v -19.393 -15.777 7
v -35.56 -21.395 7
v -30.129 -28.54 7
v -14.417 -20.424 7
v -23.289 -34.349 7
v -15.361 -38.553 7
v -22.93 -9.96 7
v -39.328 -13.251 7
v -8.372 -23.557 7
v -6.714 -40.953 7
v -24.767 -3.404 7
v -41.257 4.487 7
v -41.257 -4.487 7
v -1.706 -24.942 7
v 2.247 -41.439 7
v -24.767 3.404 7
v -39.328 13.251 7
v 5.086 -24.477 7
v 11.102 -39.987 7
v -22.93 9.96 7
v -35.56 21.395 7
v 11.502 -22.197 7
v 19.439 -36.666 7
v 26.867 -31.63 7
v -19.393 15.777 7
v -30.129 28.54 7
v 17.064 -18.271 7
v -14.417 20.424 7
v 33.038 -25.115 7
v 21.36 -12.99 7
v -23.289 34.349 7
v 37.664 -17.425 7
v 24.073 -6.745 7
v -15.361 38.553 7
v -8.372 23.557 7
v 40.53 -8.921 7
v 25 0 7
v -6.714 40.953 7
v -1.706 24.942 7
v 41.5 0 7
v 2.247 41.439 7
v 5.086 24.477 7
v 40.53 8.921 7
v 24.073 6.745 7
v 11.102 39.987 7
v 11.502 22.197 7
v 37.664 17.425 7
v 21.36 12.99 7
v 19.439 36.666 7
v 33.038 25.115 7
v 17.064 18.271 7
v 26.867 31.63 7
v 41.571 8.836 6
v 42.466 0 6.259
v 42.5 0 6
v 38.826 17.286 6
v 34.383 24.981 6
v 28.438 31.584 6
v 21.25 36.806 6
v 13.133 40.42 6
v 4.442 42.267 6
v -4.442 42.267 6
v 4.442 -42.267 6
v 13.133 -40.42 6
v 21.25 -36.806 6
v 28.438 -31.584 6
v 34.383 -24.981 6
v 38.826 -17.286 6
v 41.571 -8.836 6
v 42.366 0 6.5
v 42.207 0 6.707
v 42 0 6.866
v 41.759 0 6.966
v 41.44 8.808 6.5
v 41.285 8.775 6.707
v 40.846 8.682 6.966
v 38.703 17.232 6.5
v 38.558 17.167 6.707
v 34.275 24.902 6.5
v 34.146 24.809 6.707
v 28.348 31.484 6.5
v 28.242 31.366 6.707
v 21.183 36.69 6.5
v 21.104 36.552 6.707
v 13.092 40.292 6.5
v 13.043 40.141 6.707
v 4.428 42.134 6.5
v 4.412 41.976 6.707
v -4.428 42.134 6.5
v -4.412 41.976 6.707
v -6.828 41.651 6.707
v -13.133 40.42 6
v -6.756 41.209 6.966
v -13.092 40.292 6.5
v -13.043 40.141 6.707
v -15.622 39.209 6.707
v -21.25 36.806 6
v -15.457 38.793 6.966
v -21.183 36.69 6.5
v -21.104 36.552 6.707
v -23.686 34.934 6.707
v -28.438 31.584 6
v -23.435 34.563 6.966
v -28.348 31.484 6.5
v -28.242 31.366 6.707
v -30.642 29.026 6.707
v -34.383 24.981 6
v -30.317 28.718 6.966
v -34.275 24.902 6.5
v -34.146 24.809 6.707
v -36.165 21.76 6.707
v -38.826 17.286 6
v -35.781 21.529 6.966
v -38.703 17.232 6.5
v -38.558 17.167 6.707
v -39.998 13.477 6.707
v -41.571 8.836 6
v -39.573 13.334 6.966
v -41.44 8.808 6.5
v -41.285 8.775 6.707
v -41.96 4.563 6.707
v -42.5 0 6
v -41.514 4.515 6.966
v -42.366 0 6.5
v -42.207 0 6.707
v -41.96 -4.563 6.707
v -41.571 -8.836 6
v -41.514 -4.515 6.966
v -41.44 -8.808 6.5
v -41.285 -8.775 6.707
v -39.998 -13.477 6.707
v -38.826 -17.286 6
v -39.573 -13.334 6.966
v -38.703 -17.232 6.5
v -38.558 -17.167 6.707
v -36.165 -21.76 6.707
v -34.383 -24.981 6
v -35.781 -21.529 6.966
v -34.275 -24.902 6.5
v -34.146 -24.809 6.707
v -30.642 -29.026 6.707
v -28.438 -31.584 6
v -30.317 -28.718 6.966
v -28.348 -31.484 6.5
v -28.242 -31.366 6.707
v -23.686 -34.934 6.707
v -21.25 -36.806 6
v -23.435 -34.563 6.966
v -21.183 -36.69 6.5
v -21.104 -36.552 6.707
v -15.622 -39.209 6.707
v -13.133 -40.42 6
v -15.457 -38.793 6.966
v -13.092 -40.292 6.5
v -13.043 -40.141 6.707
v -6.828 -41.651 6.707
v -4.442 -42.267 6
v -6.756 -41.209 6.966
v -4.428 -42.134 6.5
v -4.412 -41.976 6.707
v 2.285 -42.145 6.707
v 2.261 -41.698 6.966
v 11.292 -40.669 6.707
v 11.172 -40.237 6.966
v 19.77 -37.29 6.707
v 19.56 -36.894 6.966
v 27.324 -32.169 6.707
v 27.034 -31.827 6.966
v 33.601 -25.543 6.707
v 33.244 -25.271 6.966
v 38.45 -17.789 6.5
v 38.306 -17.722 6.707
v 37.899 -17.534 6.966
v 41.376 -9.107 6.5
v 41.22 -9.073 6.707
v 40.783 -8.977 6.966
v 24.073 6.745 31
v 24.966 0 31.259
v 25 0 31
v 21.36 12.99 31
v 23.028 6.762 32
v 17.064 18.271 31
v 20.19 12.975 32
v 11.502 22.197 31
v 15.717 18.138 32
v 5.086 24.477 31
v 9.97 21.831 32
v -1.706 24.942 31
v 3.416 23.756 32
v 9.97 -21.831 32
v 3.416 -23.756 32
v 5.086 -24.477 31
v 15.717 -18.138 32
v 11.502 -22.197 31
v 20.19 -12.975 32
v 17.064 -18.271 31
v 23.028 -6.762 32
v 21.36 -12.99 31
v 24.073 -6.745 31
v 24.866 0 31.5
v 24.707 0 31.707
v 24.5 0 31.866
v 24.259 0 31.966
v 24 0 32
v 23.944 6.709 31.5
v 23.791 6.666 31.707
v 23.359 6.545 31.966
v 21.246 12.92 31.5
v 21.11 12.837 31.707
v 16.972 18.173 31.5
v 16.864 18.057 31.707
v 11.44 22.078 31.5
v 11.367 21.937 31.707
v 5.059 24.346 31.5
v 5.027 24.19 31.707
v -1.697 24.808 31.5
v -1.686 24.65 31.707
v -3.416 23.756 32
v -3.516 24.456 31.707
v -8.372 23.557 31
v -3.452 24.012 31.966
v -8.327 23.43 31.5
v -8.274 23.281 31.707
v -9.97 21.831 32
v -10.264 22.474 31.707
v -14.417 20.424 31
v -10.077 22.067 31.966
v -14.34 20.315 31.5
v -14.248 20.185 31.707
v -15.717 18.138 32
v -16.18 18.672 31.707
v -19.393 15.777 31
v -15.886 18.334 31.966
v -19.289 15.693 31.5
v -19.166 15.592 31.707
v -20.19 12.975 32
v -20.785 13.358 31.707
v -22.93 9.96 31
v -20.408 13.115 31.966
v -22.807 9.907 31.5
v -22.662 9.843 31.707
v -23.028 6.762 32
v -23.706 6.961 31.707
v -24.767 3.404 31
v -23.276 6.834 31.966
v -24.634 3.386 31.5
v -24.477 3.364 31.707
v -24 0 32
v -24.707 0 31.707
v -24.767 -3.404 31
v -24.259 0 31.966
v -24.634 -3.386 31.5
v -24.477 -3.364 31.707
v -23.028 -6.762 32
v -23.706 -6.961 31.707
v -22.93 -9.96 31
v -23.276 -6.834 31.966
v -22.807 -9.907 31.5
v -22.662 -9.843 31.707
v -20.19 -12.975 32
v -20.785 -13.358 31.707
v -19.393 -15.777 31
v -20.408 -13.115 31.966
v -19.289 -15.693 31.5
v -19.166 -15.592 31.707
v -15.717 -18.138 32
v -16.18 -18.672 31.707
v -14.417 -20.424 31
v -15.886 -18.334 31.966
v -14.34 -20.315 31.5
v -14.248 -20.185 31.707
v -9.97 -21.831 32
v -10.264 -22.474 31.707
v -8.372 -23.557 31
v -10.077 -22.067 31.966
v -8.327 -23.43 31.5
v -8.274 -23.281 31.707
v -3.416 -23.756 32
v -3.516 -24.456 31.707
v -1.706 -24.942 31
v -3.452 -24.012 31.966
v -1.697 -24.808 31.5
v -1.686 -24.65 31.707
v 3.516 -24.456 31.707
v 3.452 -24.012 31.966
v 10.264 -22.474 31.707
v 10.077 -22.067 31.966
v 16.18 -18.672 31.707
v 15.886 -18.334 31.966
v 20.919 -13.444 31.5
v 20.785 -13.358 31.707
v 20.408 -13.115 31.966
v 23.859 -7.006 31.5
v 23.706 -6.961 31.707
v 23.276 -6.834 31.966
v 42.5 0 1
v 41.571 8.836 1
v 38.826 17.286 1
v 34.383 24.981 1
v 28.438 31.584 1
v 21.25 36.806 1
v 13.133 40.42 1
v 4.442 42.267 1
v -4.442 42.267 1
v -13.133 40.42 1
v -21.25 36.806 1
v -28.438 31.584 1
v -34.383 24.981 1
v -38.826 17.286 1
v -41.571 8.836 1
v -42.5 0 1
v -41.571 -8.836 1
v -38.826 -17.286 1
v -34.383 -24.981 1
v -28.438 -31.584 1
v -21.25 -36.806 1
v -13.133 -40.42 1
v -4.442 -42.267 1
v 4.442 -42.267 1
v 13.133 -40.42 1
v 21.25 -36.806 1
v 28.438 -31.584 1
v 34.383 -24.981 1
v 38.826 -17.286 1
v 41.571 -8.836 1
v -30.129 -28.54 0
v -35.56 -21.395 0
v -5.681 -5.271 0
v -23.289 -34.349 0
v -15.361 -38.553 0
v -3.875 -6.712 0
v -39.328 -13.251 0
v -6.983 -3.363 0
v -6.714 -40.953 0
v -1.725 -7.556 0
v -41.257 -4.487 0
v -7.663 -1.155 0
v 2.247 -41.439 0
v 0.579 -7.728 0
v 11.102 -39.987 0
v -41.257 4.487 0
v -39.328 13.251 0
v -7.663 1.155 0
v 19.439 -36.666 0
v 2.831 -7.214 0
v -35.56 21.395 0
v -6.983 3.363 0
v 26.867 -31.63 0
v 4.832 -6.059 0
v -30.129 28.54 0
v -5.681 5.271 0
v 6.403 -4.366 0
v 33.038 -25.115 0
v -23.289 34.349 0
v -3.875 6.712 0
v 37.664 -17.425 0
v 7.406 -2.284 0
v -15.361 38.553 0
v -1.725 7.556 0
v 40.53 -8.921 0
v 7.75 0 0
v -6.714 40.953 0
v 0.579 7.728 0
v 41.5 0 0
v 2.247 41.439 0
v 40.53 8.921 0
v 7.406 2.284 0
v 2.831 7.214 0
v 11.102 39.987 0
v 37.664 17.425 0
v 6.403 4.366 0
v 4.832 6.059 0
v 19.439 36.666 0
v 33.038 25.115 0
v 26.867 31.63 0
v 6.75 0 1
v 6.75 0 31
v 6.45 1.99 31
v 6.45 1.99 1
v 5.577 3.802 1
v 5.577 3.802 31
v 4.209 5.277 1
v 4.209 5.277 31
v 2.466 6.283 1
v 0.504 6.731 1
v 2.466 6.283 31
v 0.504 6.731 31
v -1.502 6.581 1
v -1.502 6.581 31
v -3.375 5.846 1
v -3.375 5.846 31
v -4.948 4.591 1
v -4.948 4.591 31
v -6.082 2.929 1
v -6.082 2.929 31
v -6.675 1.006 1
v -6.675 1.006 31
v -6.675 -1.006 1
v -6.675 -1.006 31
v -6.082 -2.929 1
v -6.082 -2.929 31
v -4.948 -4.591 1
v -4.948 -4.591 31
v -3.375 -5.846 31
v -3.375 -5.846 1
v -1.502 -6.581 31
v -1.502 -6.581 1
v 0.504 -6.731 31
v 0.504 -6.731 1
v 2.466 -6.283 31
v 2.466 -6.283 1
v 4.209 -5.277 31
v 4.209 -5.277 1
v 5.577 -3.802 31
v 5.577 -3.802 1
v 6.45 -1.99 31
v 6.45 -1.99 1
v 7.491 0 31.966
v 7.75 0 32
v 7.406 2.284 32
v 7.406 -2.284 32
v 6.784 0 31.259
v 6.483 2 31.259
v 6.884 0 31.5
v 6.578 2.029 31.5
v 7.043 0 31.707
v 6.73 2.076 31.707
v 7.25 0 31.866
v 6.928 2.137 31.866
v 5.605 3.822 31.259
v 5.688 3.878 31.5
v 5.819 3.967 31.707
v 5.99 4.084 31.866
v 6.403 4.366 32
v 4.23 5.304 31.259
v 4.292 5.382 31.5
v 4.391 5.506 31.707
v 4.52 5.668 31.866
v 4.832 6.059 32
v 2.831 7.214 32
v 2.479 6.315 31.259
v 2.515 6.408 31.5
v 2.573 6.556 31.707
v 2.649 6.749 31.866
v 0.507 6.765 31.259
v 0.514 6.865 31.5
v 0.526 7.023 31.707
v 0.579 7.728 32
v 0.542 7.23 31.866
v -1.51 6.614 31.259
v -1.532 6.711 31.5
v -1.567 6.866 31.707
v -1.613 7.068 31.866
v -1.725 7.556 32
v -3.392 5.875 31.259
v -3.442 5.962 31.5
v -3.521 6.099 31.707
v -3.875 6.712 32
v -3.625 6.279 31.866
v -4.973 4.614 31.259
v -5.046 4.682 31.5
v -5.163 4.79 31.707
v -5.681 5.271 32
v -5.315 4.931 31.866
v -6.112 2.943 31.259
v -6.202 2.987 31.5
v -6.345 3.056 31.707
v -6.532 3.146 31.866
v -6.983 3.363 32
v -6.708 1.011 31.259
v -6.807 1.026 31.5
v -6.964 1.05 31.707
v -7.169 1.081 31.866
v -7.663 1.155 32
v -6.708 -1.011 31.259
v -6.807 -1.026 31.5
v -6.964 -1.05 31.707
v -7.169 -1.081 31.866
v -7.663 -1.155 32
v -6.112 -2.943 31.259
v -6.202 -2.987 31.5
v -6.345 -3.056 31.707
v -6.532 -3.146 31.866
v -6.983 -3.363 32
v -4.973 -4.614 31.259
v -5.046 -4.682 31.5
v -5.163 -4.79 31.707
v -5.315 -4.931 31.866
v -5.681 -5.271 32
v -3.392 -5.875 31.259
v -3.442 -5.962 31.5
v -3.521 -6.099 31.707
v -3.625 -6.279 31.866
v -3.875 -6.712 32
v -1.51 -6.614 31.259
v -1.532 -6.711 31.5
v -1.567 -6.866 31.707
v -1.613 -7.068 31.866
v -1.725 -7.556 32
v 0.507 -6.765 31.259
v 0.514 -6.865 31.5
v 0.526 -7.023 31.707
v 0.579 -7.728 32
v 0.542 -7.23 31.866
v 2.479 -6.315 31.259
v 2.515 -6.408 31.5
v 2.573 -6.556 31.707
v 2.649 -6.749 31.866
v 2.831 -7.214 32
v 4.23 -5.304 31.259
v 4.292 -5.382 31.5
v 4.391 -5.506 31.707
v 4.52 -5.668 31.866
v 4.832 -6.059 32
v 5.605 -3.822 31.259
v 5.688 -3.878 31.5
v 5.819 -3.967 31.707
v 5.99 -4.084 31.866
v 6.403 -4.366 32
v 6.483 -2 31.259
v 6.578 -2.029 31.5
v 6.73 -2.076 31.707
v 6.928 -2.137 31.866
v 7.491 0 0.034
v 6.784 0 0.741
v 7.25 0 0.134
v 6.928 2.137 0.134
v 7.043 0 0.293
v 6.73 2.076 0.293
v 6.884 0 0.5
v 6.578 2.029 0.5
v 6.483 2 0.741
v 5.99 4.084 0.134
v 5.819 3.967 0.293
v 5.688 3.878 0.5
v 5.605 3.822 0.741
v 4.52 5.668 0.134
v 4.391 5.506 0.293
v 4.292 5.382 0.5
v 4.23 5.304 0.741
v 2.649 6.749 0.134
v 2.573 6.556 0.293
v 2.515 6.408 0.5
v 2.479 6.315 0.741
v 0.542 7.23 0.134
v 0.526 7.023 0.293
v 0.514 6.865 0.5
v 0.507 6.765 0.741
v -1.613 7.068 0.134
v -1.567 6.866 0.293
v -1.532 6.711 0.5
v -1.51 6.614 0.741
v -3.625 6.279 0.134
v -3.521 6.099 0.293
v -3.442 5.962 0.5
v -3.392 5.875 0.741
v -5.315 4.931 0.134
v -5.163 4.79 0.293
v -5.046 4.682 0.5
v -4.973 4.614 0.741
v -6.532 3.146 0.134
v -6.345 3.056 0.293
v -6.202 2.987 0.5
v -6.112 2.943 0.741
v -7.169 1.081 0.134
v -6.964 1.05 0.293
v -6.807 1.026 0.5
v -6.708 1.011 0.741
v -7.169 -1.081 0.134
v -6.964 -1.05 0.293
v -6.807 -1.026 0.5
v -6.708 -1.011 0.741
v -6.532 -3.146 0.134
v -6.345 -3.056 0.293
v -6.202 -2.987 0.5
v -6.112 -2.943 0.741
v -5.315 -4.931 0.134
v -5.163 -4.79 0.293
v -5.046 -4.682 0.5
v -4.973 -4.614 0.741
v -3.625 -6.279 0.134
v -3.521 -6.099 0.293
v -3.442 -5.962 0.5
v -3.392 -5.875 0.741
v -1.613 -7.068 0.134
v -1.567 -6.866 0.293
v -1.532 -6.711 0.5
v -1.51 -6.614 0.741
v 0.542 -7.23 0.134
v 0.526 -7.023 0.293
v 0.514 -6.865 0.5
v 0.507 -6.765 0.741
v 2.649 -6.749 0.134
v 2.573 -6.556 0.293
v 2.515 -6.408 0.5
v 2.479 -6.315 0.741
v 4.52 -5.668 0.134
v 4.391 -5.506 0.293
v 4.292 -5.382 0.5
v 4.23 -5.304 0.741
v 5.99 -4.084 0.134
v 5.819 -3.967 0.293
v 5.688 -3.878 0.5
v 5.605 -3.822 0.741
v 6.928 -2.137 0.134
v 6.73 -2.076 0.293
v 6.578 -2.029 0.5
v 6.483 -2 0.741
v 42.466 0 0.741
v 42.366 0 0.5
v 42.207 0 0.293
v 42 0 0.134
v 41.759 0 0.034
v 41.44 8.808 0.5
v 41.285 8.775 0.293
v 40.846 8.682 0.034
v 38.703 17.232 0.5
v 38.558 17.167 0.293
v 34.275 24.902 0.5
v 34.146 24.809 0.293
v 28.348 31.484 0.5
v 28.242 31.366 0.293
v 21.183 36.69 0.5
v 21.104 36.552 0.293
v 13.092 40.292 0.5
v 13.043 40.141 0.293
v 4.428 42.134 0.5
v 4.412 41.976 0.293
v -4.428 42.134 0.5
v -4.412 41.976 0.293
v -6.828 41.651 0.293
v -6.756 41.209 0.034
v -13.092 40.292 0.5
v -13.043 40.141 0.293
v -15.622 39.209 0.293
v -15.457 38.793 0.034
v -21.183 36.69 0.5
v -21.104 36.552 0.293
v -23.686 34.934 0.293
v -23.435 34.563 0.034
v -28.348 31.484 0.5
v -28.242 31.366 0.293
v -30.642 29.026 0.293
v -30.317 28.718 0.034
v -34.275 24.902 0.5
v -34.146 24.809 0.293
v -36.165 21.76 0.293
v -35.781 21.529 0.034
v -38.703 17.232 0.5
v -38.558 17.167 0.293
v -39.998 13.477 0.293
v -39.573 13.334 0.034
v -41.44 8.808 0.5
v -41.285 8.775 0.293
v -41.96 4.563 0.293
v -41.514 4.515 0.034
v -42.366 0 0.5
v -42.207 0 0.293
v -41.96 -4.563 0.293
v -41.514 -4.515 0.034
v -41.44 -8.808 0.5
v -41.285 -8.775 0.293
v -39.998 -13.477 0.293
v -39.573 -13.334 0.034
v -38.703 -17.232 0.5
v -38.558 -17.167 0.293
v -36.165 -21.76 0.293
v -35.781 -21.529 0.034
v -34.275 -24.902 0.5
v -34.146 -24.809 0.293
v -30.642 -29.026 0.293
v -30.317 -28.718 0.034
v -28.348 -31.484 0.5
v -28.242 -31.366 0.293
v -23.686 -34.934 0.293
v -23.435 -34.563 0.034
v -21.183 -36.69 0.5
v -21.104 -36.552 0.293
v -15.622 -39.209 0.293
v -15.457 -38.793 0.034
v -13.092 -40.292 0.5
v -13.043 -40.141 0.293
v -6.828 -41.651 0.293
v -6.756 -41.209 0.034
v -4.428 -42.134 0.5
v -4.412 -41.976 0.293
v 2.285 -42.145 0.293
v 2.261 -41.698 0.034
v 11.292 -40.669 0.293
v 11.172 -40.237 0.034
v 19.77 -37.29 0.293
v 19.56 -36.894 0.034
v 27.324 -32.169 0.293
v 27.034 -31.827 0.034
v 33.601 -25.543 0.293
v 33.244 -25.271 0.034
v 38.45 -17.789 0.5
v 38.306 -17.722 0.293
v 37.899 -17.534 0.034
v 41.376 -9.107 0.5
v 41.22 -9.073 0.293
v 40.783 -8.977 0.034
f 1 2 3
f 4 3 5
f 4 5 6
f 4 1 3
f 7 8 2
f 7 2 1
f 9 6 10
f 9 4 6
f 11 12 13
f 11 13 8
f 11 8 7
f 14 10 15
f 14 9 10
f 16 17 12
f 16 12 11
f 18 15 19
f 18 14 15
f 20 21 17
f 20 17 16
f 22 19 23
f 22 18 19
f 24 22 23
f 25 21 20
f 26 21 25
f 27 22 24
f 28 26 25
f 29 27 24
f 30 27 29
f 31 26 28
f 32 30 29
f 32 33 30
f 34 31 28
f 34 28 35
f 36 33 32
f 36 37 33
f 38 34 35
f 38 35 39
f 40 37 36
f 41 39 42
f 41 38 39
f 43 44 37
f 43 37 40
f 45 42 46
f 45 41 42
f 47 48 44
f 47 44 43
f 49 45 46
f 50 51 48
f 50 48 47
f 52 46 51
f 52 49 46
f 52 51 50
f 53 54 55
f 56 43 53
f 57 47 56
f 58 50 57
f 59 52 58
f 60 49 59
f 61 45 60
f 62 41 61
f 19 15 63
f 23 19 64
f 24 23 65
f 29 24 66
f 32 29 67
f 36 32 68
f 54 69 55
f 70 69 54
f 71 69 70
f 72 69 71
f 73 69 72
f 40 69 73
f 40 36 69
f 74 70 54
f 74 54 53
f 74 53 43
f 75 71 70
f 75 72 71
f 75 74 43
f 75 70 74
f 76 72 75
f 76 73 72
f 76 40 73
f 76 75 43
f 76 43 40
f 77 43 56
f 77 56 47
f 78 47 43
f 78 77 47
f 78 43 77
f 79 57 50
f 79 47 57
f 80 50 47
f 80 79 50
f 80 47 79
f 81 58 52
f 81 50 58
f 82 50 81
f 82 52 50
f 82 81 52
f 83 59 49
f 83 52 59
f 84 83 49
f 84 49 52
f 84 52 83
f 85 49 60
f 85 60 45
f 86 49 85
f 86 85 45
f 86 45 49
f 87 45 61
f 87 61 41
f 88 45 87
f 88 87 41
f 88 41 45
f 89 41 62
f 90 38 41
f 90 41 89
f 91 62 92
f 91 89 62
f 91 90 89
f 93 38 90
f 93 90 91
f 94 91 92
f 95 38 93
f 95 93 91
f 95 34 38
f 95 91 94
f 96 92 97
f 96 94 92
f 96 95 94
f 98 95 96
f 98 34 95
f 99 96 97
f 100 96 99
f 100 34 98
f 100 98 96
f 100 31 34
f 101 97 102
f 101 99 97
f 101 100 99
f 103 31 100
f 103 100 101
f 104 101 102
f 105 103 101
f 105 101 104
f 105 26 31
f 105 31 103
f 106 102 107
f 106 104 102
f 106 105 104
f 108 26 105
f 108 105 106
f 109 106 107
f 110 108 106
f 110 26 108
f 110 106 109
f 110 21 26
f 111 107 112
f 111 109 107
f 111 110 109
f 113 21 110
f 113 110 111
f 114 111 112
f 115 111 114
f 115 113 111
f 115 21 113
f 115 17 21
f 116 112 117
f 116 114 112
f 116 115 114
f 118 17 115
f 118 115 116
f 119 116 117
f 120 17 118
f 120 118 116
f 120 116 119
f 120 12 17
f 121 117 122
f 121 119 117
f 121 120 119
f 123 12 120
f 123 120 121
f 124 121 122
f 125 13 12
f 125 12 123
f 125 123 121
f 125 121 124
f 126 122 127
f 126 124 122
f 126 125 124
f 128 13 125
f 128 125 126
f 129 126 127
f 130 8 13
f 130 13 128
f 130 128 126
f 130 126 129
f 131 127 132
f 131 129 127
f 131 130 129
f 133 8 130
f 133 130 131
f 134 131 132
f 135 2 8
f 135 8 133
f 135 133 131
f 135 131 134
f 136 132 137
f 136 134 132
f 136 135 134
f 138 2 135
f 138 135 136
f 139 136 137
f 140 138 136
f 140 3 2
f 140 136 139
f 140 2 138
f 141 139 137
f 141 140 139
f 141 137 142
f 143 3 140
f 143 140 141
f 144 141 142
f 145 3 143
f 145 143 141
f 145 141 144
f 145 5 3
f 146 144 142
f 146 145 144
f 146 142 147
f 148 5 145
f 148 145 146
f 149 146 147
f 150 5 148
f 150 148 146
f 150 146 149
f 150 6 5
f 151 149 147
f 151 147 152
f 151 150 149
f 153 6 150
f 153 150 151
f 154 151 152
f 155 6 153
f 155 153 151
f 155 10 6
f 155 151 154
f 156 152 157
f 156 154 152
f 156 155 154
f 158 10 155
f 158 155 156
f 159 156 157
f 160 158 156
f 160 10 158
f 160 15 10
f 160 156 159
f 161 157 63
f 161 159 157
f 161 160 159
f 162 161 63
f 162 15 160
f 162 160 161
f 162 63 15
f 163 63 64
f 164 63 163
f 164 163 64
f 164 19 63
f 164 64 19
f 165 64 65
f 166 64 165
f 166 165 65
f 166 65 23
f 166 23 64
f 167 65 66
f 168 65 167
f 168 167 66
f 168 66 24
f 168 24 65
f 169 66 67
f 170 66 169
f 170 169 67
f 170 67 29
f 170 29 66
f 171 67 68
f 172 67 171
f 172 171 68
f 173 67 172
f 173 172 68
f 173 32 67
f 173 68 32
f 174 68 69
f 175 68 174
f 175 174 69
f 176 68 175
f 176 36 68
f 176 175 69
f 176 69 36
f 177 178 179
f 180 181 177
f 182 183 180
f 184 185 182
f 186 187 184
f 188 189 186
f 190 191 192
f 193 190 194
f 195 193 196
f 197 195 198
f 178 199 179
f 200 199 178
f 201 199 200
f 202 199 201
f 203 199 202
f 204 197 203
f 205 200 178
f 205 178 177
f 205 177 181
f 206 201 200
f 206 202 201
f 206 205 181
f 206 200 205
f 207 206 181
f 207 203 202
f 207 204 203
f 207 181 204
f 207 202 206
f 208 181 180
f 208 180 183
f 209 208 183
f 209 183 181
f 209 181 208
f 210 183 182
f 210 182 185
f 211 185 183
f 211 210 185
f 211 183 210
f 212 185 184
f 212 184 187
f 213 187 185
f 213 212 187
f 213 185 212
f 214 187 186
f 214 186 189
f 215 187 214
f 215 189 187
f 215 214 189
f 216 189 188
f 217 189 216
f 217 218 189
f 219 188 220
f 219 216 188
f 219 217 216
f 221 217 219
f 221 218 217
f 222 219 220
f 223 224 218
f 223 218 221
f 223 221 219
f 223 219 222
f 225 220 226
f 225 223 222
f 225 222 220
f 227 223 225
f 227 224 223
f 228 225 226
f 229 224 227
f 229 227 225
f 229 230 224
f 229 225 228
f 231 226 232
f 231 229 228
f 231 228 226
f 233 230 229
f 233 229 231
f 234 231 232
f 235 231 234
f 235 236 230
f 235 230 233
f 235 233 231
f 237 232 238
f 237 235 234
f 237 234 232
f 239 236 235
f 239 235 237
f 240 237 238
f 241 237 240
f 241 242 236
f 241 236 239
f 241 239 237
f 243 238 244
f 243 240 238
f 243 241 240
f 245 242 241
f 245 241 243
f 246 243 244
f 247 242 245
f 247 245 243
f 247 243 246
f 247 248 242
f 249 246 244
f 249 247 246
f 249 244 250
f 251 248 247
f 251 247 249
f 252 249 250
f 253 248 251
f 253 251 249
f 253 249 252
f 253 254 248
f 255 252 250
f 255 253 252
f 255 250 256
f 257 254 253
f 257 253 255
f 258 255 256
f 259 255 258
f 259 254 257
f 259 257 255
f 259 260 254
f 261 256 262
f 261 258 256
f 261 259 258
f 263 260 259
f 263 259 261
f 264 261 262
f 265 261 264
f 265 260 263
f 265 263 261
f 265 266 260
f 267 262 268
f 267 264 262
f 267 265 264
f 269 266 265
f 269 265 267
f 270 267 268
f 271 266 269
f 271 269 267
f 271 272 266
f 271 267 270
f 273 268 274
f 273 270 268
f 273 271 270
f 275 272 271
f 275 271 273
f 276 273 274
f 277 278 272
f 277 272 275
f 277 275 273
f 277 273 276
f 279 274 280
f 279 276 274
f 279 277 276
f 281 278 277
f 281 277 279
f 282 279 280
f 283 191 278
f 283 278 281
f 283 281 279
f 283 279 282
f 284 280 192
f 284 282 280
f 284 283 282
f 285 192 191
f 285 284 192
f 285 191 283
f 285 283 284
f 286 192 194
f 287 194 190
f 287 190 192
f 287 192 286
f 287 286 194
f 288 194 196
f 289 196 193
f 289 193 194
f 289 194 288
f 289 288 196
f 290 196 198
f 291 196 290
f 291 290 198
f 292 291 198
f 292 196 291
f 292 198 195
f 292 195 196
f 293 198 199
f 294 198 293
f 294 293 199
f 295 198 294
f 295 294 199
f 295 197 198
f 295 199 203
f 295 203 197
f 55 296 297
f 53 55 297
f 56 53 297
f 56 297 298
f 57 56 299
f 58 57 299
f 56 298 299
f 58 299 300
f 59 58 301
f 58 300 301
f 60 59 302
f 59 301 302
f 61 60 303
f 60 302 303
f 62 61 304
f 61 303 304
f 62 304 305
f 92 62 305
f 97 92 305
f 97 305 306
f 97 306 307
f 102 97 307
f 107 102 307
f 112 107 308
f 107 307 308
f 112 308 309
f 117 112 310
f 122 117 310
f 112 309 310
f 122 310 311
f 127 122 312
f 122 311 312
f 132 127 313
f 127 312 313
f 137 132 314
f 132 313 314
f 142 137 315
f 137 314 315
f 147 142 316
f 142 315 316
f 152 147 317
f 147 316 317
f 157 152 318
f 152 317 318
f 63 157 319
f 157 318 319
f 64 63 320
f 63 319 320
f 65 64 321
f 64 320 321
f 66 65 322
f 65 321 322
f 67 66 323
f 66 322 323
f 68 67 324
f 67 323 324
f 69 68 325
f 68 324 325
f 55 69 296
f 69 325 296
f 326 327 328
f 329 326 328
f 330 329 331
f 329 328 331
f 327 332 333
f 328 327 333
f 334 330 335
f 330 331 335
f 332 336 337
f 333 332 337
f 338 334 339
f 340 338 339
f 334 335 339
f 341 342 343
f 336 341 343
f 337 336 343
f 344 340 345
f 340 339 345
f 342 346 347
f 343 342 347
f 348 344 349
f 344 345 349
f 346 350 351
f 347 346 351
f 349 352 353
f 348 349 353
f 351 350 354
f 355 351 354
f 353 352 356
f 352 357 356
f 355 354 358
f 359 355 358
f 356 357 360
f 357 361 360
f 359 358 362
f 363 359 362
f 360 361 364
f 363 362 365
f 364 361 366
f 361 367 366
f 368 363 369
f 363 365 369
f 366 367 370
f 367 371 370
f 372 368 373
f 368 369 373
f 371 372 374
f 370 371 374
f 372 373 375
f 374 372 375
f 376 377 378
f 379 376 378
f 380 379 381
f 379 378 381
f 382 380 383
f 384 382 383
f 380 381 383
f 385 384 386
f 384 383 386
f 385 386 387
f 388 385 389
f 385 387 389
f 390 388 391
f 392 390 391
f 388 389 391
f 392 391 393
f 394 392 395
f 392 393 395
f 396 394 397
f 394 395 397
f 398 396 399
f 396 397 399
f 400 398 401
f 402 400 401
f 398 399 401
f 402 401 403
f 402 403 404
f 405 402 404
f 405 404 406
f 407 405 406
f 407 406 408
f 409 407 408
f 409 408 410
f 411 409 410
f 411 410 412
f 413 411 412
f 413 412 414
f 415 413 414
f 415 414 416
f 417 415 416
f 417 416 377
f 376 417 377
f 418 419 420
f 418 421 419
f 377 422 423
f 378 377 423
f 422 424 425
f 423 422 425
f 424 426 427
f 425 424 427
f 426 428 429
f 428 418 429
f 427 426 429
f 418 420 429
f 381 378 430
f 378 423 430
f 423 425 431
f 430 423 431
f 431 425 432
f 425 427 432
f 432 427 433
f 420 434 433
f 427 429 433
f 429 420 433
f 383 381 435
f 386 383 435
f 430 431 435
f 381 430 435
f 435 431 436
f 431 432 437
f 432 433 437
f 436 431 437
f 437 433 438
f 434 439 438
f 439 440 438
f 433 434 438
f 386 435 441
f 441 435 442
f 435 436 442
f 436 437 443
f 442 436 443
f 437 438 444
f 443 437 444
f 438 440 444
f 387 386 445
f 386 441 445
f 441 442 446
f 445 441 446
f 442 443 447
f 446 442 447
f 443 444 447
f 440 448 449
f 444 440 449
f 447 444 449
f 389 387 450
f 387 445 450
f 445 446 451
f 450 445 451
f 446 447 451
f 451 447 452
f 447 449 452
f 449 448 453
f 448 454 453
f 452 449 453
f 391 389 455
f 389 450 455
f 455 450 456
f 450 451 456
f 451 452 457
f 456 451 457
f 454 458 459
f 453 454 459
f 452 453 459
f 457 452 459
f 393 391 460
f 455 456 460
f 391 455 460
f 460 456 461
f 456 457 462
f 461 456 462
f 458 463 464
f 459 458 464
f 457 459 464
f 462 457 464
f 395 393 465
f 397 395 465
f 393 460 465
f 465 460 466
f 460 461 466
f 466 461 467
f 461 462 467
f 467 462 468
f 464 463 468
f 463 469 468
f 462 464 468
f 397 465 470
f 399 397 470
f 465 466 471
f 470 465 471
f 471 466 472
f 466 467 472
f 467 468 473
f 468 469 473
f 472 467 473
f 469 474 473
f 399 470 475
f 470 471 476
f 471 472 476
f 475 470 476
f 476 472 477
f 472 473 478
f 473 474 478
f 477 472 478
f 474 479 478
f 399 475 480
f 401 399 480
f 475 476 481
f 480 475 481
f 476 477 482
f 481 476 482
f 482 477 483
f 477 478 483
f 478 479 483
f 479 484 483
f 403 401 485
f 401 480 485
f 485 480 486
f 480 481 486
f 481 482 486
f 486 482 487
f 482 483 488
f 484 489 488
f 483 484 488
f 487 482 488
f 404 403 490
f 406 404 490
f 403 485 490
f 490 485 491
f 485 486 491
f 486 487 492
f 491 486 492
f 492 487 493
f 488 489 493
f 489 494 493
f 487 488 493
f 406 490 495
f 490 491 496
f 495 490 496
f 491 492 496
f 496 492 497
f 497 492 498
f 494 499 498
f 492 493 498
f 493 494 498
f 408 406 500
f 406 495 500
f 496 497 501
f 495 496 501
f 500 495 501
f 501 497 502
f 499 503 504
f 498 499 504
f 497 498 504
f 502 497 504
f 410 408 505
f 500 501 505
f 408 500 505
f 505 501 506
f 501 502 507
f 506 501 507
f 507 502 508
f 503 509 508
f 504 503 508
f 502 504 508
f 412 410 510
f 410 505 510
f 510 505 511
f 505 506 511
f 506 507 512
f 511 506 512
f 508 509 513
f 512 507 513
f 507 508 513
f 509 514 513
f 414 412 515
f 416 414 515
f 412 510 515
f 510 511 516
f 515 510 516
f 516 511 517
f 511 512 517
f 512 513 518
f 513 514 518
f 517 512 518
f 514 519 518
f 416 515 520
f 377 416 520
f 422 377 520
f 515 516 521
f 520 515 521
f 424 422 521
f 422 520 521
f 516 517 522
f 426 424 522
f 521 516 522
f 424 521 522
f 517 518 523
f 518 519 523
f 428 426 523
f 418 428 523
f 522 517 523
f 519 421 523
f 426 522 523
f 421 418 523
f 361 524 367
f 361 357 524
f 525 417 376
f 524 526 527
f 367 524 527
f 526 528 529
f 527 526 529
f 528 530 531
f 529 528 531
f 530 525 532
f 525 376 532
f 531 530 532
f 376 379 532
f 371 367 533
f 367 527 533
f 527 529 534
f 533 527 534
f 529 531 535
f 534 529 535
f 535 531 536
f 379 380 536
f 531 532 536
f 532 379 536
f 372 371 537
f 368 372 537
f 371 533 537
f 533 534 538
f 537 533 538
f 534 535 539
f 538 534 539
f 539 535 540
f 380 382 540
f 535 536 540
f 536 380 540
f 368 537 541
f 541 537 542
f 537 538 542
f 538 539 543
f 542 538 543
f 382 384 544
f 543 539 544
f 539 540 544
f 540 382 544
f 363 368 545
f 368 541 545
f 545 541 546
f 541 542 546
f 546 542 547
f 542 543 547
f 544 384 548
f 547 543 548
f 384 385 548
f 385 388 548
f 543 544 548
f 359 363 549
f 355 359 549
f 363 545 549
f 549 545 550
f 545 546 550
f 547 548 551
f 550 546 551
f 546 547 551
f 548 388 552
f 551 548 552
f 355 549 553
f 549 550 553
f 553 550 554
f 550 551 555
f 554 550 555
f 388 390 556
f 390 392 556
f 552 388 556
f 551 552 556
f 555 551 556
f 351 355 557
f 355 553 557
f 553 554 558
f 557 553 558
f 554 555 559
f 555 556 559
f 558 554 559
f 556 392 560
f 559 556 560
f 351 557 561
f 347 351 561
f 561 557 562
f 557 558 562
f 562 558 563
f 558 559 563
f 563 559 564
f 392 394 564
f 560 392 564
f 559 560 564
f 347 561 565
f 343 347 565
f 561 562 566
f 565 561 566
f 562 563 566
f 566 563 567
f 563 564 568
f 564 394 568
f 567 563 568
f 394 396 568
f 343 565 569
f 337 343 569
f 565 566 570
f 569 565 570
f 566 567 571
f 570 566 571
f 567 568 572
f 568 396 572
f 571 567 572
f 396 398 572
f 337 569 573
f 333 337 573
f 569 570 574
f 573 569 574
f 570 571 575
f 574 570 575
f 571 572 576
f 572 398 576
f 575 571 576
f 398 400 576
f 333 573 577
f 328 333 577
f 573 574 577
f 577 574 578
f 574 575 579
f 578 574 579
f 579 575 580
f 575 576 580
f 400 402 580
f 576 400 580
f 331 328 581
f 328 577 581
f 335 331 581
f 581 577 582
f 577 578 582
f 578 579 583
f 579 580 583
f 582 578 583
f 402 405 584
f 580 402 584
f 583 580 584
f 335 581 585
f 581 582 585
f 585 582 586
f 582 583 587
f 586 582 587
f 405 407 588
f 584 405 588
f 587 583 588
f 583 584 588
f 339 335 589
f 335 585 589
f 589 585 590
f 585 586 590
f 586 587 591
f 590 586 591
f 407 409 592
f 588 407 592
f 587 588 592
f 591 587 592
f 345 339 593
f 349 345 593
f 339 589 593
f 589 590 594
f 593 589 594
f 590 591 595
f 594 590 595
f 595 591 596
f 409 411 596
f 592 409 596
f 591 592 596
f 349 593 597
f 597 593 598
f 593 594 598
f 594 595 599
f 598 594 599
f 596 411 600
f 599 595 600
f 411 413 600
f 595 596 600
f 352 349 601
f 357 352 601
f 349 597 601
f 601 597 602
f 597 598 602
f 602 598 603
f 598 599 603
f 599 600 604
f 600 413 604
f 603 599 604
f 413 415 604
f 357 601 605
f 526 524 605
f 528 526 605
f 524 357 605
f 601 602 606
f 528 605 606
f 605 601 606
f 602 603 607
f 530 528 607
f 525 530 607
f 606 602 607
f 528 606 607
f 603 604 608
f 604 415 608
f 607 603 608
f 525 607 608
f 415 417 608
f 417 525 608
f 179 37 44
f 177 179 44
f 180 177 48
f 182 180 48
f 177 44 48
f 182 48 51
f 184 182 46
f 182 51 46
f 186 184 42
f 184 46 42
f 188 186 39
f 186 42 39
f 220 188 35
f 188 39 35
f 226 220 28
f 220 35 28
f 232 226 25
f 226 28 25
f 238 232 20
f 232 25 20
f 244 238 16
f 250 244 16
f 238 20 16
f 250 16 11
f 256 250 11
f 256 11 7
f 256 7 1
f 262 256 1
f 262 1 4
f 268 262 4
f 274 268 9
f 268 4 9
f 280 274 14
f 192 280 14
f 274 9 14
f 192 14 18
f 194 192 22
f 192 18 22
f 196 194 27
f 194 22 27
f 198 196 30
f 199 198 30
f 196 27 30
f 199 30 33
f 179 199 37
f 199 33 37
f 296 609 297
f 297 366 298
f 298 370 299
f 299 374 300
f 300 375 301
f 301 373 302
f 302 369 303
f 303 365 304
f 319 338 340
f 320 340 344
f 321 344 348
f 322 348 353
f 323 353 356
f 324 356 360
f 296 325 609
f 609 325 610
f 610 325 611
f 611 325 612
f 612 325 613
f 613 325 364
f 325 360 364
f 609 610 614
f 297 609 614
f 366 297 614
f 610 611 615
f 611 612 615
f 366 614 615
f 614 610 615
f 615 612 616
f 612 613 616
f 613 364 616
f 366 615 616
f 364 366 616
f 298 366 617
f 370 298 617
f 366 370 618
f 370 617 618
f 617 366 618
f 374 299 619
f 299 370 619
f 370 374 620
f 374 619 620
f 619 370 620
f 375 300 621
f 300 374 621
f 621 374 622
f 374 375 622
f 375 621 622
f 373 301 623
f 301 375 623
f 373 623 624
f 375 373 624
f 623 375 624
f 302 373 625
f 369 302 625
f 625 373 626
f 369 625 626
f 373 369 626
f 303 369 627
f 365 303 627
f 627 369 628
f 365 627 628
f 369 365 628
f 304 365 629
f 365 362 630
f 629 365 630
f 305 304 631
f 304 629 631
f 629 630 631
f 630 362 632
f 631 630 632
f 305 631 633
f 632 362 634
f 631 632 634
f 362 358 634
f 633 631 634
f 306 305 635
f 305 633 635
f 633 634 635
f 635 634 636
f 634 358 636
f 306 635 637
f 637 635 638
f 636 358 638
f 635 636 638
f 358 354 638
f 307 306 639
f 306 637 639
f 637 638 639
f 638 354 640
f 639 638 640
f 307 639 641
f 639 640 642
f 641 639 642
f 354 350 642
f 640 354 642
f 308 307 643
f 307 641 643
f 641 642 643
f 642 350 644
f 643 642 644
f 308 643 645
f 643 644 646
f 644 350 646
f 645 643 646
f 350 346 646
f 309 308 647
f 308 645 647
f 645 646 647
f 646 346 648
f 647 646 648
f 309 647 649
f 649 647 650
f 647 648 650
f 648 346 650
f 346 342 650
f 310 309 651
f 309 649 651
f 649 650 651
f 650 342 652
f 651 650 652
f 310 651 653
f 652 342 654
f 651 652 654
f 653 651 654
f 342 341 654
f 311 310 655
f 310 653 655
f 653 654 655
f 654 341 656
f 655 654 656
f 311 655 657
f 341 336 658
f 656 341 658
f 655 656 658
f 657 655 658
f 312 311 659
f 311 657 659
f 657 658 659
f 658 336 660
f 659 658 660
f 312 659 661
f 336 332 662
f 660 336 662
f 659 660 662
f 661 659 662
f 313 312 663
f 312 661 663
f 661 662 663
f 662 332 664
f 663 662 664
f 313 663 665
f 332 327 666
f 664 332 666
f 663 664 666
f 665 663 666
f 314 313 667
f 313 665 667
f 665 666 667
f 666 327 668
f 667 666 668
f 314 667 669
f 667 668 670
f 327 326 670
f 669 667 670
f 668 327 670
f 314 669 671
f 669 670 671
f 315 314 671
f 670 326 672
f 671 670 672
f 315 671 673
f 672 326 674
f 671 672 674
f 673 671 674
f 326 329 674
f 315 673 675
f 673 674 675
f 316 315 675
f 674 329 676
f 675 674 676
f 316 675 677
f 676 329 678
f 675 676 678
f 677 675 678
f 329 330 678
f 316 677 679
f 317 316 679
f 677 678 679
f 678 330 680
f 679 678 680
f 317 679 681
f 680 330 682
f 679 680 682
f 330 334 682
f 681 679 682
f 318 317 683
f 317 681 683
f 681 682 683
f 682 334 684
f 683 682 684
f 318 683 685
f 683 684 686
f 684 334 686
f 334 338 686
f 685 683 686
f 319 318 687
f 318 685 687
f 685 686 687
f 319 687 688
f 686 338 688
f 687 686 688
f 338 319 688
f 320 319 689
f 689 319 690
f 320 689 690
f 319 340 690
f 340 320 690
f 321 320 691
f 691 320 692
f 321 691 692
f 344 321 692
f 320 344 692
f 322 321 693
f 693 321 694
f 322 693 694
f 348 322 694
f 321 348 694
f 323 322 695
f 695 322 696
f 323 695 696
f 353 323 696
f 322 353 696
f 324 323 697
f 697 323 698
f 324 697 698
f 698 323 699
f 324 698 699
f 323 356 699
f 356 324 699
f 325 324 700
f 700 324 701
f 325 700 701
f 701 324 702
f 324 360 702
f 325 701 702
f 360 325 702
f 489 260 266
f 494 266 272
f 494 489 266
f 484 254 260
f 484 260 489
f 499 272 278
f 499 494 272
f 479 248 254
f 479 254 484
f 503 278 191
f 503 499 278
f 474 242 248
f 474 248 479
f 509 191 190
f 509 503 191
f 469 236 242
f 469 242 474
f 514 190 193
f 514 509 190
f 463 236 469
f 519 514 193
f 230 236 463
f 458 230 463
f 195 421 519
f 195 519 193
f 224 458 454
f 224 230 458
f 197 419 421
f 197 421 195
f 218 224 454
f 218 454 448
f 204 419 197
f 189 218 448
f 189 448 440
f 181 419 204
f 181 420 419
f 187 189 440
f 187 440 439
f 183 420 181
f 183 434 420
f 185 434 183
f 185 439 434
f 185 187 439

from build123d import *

# Parameters (mm, degrees)
F0_R     = 42.5
F1_DEPTH = 7
F2_R     = 25
F3_DEPTH = 25
F4_R     = 6.75
F5_DEPTH = 32.001
F6_R     = 1


with BuildPart() as f1:
    # F0 (on Top) → F1 (new body)
    with BuildSketch(Plane.XY):
        Circle(F0_R)
    extrude(amount=F1_DEPTH)

    # F2 (on face) → F3 (join)
    with BuildSketch(Plane.XY.offset(7)):
        Circle(F2_R)
    extrude(amount=F3_DEPTH)

    # F4 (on face) → F5 (cut, through all)
    with BuildSketch(Plane.XY.offset(32)):
        Circle(F4_R)
    extrude(amount=-F5_DEPTH, mode=Mode.SUBTRACT)

    # F6
    f6_edges = [f1.edges().sort_by_distance(p)[0] for p in [
        (-6.75, 0, 32),
        (-6.75, 0, 0),
        (-42.5, 0, 0),
        (-42.5, 0, 7),
        (-25, 0, 32),
    ]]
    fillet(f6_edges, radius=F6_R)


solid = f1.part
